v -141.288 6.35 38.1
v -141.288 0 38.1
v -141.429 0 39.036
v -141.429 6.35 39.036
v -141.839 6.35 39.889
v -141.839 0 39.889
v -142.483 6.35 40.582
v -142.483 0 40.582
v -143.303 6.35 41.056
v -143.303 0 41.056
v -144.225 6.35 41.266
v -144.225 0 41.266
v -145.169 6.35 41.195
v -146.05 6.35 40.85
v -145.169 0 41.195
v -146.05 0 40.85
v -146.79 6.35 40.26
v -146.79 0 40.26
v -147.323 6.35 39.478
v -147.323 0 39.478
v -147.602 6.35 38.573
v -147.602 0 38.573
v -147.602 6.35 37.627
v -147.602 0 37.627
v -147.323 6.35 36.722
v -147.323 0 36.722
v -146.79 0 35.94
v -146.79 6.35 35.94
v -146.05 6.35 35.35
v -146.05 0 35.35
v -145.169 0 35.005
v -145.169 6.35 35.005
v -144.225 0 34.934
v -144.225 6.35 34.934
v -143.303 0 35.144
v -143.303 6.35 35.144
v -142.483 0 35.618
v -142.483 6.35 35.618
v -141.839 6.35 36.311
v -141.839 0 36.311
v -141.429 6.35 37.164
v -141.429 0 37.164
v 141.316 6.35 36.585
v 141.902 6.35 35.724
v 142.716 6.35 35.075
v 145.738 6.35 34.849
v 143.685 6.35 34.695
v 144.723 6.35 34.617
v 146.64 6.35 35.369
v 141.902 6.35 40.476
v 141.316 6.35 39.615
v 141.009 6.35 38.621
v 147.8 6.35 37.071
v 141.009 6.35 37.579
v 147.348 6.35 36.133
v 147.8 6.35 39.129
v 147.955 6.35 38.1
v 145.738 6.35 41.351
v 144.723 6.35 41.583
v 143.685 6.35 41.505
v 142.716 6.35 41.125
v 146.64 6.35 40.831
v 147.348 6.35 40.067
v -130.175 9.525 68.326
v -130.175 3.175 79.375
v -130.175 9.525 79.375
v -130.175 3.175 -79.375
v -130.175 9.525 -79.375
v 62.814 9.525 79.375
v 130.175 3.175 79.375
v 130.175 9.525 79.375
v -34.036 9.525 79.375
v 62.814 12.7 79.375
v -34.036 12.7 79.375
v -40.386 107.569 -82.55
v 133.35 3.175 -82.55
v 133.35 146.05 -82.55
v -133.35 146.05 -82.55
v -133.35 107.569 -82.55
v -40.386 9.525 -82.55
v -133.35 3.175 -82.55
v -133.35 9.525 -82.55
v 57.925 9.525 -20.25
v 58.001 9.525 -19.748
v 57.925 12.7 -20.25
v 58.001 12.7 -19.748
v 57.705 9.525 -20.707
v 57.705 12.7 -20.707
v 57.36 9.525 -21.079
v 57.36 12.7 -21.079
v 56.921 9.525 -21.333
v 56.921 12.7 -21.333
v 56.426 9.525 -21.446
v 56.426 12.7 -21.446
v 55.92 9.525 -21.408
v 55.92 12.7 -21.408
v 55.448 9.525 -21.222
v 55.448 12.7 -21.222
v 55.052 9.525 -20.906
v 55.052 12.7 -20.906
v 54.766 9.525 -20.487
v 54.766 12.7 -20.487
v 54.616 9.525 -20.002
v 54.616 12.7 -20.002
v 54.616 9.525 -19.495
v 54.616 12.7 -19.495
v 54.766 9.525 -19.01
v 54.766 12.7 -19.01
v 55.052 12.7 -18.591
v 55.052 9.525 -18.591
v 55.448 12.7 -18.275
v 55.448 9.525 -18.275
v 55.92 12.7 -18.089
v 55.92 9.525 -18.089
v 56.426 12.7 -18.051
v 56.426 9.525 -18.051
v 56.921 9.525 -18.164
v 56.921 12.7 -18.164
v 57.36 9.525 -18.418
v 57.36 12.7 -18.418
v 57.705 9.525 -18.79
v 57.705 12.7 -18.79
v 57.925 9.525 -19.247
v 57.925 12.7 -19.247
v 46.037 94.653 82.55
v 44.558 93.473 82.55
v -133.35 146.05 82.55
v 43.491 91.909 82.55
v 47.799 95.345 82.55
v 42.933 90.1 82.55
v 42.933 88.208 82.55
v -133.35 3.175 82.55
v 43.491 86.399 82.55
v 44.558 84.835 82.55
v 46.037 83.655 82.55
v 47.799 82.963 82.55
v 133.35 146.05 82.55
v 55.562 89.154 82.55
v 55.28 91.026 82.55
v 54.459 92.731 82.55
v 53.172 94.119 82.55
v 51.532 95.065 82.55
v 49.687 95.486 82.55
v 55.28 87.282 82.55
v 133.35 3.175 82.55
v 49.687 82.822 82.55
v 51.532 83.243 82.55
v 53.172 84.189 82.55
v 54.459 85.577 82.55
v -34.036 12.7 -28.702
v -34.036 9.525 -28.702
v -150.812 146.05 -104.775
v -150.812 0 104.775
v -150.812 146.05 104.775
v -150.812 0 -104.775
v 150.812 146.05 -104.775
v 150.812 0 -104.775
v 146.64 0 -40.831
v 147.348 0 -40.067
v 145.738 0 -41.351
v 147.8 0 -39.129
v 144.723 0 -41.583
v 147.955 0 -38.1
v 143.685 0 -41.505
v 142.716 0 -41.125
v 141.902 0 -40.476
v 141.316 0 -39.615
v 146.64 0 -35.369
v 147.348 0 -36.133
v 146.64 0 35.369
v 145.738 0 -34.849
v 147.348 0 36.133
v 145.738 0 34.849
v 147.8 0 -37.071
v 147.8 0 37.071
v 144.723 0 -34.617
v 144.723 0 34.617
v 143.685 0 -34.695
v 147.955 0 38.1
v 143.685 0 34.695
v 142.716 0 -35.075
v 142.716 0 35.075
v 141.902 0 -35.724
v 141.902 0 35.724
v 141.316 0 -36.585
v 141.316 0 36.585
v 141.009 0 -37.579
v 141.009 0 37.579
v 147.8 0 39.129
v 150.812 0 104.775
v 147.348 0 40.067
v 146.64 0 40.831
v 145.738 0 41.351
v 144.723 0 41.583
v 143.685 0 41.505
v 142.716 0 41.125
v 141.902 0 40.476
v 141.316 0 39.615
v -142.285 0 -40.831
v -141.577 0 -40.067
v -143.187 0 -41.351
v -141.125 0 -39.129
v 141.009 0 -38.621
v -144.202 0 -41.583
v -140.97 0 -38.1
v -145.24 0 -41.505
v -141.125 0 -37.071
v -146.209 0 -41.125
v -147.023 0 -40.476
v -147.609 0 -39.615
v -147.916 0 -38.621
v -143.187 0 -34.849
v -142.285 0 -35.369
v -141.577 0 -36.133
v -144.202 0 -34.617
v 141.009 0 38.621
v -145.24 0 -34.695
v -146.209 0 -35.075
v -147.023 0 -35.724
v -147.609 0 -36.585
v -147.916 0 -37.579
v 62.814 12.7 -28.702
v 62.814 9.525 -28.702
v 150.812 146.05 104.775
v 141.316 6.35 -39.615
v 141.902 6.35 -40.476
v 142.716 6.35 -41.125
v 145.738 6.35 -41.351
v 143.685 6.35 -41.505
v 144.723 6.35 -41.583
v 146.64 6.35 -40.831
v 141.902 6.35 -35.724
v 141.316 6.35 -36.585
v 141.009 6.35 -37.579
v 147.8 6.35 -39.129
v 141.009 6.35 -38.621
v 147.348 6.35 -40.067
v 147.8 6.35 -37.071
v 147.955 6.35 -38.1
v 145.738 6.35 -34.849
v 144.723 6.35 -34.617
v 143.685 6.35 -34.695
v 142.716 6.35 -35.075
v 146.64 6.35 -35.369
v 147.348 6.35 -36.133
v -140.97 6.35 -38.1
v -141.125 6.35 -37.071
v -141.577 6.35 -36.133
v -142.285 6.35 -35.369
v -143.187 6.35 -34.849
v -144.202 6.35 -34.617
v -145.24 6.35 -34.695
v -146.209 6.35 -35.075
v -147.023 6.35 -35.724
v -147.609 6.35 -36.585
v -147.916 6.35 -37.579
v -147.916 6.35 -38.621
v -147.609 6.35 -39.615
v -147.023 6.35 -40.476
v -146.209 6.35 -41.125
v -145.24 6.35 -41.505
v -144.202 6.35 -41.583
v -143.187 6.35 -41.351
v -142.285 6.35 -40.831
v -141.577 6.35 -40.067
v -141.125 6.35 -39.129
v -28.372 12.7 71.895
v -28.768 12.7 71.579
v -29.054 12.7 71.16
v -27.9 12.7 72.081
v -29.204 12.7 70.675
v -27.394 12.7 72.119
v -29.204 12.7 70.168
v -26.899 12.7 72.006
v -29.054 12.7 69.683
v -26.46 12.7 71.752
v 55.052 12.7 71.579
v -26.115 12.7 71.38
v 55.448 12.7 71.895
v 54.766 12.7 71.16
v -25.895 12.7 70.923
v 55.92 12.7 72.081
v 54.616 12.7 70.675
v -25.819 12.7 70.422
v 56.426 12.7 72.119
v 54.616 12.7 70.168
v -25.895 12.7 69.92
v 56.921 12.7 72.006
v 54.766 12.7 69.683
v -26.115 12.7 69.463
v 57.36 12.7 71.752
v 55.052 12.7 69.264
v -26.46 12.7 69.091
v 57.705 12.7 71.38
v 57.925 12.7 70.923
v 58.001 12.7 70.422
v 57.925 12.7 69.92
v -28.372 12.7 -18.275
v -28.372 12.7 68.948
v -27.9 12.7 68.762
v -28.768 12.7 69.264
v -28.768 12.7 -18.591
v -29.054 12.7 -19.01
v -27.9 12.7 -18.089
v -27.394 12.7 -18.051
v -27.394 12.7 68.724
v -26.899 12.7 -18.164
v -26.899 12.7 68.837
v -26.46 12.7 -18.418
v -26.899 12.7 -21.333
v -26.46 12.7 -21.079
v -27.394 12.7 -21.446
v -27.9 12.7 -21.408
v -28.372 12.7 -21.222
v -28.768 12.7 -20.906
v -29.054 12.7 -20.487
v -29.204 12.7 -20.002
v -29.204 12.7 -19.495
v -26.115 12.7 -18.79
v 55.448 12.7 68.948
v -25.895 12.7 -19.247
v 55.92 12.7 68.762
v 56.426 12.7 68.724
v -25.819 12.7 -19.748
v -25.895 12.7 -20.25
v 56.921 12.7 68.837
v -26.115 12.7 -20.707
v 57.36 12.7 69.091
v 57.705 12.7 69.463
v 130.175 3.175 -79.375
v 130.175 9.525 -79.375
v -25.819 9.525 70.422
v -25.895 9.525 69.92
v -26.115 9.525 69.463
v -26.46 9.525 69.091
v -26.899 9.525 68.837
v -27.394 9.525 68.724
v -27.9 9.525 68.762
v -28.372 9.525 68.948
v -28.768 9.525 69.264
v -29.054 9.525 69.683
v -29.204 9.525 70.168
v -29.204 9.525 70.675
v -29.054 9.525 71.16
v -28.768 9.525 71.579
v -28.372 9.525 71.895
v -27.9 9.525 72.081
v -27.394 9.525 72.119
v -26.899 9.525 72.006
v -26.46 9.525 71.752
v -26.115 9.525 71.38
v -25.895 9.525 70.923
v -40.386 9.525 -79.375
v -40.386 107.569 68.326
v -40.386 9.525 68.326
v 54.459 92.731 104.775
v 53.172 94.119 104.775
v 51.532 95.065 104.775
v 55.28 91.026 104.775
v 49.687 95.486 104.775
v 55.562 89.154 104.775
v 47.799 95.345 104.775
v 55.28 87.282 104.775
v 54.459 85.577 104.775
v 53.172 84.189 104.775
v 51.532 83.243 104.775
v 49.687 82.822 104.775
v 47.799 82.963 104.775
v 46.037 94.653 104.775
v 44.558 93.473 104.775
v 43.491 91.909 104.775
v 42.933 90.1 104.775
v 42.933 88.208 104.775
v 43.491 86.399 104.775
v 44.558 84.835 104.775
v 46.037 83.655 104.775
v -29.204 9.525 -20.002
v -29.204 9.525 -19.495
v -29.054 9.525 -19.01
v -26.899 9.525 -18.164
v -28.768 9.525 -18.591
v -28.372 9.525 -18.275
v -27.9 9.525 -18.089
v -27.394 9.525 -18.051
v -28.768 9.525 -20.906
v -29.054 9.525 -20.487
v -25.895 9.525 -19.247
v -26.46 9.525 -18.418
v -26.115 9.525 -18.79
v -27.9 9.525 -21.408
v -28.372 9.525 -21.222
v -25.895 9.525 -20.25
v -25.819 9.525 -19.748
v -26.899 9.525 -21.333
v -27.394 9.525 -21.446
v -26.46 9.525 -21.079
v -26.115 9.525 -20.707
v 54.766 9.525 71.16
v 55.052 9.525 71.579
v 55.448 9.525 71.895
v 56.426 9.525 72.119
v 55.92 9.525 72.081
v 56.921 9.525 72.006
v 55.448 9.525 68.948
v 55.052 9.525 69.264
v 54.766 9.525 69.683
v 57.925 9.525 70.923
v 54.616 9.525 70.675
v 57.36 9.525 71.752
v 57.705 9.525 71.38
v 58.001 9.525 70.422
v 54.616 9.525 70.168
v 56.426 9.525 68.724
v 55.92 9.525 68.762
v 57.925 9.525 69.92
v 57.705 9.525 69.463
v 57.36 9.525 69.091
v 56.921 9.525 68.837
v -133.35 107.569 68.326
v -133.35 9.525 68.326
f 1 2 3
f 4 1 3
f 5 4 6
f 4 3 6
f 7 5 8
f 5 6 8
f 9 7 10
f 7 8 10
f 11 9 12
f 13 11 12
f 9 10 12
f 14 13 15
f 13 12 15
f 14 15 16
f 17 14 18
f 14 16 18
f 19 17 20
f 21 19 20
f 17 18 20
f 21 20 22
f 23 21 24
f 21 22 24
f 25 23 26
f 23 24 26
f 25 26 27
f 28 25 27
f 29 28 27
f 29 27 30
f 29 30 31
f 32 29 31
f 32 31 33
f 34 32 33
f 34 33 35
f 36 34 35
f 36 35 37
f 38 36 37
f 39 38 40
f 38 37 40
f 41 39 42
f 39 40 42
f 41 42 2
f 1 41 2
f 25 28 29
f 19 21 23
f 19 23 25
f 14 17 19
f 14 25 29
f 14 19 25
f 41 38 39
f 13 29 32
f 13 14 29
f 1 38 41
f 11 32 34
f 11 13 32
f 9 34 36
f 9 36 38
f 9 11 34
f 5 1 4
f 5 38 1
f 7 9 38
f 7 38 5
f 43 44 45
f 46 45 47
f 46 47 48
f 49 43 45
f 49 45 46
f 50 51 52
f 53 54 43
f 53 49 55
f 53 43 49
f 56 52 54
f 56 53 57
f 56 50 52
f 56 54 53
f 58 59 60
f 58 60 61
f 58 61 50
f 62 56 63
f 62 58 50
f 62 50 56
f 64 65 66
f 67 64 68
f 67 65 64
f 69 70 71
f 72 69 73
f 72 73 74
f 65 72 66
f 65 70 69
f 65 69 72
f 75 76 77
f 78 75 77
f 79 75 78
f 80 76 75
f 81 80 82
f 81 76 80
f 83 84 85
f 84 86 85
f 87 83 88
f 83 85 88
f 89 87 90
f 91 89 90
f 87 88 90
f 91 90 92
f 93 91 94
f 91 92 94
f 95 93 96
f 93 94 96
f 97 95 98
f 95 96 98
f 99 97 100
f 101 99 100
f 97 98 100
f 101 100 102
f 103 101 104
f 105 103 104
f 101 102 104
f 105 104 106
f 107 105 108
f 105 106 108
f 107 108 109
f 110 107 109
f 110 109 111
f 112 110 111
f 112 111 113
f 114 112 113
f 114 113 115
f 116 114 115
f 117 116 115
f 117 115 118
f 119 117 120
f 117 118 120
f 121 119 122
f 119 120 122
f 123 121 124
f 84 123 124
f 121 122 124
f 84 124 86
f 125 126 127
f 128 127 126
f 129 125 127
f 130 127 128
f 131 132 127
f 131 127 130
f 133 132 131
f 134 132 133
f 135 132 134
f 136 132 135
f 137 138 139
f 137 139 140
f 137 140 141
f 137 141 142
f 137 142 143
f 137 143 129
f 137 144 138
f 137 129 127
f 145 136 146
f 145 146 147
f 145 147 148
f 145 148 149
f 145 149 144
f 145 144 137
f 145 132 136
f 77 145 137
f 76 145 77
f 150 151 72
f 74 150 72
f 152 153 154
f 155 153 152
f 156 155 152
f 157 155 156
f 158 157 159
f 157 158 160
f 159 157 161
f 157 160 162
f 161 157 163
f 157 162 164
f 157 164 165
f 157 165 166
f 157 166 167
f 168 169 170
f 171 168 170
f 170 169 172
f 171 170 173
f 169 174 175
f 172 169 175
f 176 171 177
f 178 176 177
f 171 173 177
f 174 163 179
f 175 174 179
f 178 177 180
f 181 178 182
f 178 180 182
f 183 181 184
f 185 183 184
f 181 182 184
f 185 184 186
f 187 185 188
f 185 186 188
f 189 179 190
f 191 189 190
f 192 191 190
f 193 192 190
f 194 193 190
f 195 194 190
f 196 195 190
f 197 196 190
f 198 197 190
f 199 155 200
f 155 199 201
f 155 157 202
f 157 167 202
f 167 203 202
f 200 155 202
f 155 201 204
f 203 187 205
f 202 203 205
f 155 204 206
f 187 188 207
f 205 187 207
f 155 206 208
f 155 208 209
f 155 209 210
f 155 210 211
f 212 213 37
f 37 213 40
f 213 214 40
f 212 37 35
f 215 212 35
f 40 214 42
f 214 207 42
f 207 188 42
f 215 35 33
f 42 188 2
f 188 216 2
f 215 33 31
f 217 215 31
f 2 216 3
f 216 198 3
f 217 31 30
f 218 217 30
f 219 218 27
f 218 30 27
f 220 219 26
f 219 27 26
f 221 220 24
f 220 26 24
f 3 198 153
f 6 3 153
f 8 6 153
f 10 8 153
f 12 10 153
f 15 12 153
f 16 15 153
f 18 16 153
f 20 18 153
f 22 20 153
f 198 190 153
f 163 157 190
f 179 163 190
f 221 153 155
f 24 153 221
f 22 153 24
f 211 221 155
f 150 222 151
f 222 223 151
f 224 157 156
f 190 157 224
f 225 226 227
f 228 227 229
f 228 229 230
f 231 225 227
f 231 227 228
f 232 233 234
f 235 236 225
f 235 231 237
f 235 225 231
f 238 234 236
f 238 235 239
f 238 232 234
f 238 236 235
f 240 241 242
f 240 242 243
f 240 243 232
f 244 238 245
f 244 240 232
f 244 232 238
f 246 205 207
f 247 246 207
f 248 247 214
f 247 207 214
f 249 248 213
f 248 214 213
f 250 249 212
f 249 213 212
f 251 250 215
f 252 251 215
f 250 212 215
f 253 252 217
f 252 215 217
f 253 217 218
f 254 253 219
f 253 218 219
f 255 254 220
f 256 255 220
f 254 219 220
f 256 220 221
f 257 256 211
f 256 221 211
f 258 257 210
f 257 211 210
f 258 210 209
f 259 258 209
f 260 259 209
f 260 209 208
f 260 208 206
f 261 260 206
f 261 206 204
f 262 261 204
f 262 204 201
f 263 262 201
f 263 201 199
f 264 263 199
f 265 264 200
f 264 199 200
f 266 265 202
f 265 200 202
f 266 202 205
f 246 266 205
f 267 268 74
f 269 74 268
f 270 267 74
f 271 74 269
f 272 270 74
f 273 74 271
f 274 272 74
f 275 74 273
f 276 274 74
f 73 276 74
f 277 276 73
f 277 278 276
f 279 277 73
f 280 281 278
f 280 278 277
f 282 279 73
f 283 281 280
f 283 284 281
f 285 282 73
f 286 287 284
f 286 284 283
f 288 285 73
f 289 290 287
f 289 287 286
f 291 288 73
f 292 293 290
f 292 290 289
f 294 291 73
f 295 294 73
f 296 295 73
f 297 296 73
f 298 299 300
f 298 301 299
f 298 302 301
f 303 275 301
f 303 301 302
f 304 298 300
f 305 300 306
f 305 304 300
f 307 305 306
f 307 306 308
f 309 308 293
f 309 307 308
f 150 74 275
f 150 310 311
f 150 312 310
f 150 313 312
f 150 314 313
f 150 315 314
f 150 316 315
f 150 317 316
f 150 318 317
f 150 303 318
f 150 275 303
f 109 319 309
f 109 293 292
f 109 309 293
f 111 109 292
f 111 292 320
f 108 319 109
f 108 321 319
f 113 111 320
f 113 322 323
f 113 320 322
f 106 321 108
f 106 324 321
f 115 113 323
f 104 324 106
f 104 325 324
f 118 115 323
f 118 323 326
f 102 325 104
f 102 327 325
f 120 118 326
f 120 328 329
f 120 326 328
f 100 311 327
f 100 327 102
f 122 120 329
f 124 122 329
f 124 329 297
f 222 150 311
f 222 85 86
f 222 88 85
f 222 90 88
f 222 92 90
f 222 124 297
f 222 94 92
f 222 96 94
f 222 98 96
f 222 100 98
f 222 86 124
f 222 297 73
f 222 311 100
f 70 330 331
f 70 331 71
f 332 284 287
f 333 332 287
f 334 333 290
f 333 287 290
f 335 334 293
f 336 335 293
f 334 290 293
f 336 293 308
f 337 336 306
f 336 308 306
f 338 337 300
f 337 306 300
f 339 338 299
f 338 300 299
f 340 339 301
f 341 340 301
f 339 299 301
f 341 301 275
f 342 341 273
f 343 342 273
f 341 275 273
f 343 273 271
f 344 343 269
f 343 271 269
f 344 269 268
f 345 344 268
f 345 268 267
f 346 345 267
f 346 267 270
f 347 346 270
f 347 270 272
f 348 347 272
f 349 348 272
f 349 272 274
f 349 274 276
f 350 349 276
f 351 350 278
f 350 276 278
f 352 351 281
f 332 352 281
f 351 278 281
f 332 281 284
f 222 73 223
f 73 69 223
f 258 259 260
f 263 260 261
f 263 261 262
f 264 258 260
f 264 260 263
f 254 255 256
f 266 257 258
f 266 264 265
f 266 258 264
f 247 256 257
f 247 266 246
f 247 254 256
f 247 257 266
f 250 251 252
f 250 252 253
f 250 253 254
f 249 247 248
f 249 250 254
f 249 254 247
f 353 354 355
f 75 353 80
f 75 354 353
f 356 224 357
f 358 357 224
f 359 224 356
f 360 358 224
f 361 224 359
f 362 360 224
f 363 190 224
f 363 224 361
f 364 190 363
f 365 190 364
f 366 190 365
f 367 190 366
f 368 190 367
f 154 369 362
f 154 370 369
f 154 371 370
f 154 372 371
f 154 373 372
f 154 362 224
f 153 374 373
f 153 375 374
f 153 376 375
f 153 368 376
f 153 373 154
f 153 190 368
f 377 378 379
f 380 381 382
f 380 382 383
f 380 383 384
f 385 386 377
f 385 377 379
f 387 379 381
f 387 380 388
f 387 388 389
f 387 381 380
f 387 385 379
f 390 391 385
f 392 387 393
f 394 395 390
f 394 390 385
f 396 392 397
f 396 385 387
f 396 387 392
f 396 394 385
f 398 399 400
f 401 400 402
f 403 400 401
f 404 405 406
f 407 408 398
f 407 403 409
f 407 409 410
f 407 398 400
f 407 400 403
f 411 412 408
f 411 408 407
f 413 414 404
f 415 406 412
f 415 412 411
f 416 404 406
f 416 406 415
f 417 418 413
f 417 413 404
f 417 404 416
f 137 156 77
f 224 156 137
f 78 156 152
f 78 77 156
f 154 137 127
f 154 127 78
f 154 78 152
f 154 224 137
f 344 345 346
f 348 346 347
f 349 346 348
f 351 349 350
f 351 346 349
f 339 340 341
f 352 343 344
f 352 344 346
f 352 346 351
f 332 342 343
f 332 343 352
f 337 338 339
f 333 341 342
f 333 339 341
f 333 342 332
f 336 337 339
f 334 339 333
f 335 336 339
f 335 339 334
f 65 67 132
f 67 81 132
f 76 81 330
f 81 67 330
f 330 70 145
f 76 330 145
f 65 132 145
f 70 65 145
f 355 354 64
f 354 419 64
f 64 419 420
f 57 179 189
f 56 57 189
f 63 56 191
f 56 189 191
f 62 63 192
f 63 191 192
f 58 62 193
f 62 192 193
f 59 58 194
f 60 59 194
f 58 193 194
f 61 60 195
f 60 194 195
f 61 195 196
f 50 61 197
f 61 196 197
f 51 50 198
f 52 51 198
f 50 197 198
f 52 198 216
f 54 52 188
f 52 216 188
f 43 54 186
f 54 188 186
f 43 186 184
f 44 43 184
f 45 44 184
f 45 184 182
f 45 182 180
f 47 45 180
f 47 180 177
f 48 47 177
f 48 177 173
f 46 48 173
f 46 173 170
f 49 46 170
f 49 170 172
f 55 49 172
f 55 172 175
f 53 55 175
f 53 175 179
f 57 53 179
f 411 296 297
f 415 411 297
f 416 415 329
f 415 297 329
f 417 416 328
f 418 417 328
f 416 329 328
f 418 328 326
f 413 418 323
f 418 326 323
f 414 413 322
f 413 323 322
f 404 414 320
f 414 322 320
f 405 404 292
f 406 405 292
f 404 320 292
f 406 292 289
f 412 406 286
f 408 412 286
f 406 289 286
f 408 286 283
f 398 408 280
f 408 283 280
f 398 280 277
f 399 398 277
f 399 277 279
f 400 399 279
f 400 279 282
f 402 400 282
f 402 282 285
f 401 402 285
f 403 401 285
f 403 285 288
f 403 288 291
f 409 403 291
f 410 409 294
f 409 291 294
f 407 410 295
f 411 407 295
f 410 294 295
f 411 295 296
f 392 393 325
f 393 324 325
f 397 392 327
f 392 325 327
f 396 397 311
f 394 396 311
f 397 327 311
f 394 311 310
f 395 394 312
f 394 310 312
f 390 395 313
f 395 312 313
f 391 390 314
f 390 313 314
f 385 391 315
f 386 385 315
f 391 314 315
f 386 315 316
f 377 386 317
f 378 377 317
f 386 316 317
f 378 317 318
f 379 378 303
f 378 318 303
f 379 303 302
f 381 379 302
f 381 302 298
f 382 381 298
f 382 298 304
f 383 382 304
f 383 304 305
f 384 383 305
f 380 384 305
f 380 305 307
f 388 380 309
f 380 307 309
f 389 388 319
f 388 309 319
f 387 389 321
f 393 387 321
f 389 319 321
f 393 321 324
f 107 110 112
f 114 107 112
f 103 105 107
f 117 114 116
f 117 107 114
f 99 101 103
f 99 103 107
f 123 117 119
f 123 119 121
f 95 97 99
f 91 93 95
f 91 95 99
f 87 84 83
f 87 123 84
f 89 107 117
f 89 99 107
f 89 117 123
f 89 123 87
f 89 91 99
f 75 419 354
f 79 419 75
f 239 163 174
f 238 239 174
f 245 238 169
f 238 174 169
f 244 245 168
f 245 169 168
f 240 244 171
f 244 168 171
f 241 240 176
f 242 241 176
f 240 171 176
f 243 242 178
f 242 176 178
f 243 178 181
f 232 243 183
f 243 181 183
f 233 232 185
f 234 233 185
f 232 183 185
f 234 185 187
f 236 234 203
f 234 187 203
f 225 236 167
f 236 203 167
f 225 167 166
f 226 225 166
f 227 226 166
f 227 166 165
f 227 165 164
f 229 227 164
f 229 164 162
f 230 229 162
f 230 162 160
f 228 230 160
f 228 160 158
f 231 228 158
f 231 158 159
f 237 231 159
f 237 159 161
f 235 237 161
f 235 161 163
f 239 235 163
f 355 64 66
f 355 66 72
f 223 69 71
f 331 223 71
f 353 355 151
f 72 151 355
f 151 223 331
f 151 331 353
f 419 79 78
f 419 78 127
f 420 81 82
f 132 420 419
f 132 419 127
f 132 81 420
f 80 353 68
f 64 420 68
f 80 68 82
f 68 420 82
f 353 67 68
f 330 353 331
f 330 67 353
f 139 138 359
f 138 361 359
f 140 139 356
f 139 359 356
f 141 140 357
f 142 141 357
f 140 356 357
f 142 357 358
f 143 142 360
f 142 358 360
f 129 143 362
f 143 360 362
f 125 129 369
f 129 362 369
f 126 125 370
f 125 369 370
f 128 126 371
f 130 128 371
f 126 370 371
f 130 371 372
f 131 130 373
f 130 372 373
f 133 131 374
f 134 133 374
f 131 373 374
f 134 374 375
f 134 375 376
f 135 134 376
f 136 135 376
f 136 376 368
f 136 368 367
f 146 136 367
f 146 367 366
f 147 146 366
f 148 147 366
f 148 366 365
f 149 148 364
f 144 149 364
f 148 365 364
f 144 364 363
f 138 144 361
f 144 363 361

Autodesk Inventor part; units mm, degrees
ref_plane "YZ Plane" through (0, 0, 0) normal (1, 0, 0) x (0, 1, 0)
ref_plane "XZ Plane" through (0, 0, 0) normal (0, 1, 0) x (-1, 0, 0)
ref_plane "XY Plane" through (0, 0, 0) normal (0, 0, 1) x (1, 0, 0)
sketch "Sketch1" plane through (0, 0, 0) normal (0, 1, 0) x (-1, 0, 0)
  line L0 (133.35, 82.55) -> (-133.35, 82.55)
  line L1 (-133.35, 82.55) -> (-133.35, -82.55)
  line L2 (-133.35, -82.55) -> (133.35, -82.55)
  line L3 (133.35, -82.55) -> (133.35, 82.55)
  line L4 (133.35, 82.55) -> (-133.35, -82.55) construction
  line L5 (-133.35, 82.55) -> (133.35, -82.55) construction
  line L6 (-150.8125, 104.775) -> (150.8125, 104.775)
  line L7 (150.8125, 104.775) -> (150.8125, -104.775)
  line L8 (150.8125, -104.775) -> (-150.8125, -104.775)
  line L9 (-150.8125, -104.775) -> (-150.8125, 104.775)
  line L10 (-150.8125, 104.775) -> (150.8125, -104.775) construction
  line L11 (150.8125, 104.775) -> (-150.8125, -104.775) construction
  point P0 (0, 0)
  dimension "d0" = 165.1
  dimension "d1" = 266.7
  dimension "d2" = 209.55
  dimension "d3" = 301.625
extrude "Extrusion1" add sketch "Sketch1" along normal blind 146.05
sketch "Sketch2" plane through (0, 0, 0) normal (0, -1, 0) x (1, 0, 0)
  line L0 (133.35, 82.55) -> (-133.35, 82.55) projected
  line L1 (-133.35, -82.55) -> (133.35, -82.55) projected
  line L2 (-133.35, 82.55) -> (133.35, 82.55)
  line L3 (133.35, 82.55) -> (133.35, -82.55)
  line L4 (133.35, -82.55) -> (-133.35, -82.55)
  line L5 (-133.35, -82.55) -> (-133.35, 82.55)
  point P0 (0, 0)
  point P1 (133.35, 82.55)
  point P2 (-133.35, -82.55)
extrude "Extrusion2" add sketch "Sketch2" against normal blind 3.175
sketch "Sketch3" plane through (0, 3.175, 0) normal (0, 1, 0) x (1, 0, 0)
  line L0 (-133.35, -82.55) -> (-133.35, 82.55) projected
  line L1 (-133.35, 82.55) -> (133.35, 82.55) projected
  line L2 (-133.35, -82.55) -> (133.35, -82.55)
  line L3 (133.35, -82.55) -> (133.35, 82.55)
  line L4 (133.35, 82.55) -> (-133.35, 82.55)
  line L5 (-133.35, 82.55) -> (-133.35, -82.55)
  line L6 (130.175, -79.375) -> (-130.175, -79.375)
  line L7 (-130.175, -79.375) -> (-130.175, 79.375)
  line L8 (-130.175, 79.375) -> (130.175, 79.375)
  line L9 (130.175, 79.375) -> (130.175, -79.375)
  point P0 (0, 0)
  dimension "d8" = 3.175
extrude "Extrusion3" add sketch "Sketch3" along normal blind 6.35 contours L6 L7 L8 L9
sketch "Sketch5" plane through (-133.35, 146.05, 82.55) normal (1, 0, 0) x (0, 0, -1)
  line L0 (0, -38.481) -> (165.1, -38.481)
  line L1 (165.1, -38.481) -> (14.224, -38.481)
  line L2 (14.224, -38.481) -> (14.224, -136.525)
  line L3 (14.224, -136.525) -> (165.1, -136.525)
  line L4 (165.1, -136.525) -> (165.1, -38.481)
  point P0 (82.55, -146.05)
  point P1 (165.1, -142.875)
  dimension "d15" = 98.044
  dimension "d16" = 150.876
  dimension "d19" = 6.35
extrude "Extrusion5" add sketch "Sketch5" along normal blind 92.964
sketch "Sketch6" plane through (0, 9.525, 0) normal (0, 1, 0) x (1, 0, 0)
  line L0 (62.8142, 28.702) -> (-34.036, 28.702)
  line L1 (-34.036, 28.702) -> (-34.036, -79.375)
  line L2 (-34.036, -79.375) -> (62.8142, -79.375)
  line L3 (62.8142, -79.375) -> (62.8142, 28.702)
  line L4 (-130.175, -79.375) -> (130.175, -79.375) projected
  line L5 (-40.386, 82.55) -> (-40.386, -68.326) projected
  point P0 (0, 0)
  dimension "d20" = 108.077
  dimension "d21" = 96.8502
  dimension "d61" = 0
  dimension "d62" = 6.35
extrude "Extrusion6" add sketch "Sketch6" along normal blind 3.175
sketch "Sketch8" plane through (0, 0, 0) normal (0, -1, 0) x (1, 0, 0)
  circle A0 centre (144.4625, 38.1) radius 3.4925
  line L0 (-150.8125, 104.775) -> (150.8125, 104.775) projected
  line L1 (150.8125, 104.775) -> (150.8125, -104.775) projected
  circle A1 centre (144.4625, -38.1) radius 3.4925
  line L2 (150.8125, -104.775) -> (-150.8125, -104.775) projected
  circle A2 centre (-144.4625, 38.1) radius 3.175
  circle A3 centre (-144.4625, -38.1) radius 3.4925
  line L3 (-150.8125, -104.775) -> (-150.8125, 104.775) projected
  line L4 (150.8125, 50.8) -> (-150.8125, 50.8)
  line L5 (150.8125, -50.8) -> (-150.8125, -50.8)
  point P0 (0, 0)
  dimension "d28" = 6.985
  dimension "d30" = 6.35
  dimension "d31" = 6.35
  dimension "d33" = 6.985
  dimension "d34" = 6.35
  dimension "d36" = 6.35
  dimension "d38" = 6.985
  dimension "d39" = 6.35
  dimension "d55" = 50.8
  dimension "d56" = 50.8
  dimension "d57" = 12.7
  dimension "d58" = 12.7
  dimension "d59" = 12.7
  dimension "d60" = 12.7
extrude "Extrusion8" cut sketch "Sketch8" against normal blind 6.35 contours A0 | A1 | A2 | A3
sketch "Sketch11" plane through (0, 12.7, 0) normal (0, 1, 0) x (1, 0, 0)
  circle A0 centre (56.2991, 19.7485) radius 1.7018
  circle A1 centre (56.2991, -70.4215) radius 1.7018
  circle A2 centre (-27.5209, 19.7485) radius 1.7018
  circle A3 centre (-27.5209, -70.4215) radius 1.7018
  line L0 (62.8142, 28.702) -> (-34.036, 28.702) projected
  line L1 (-34.036, -79.375) -> (62.8142, -79.375) projected
  line L2 (62.8142, -79.375) -> (62.8142, 28.702) projected
  line L3 (-34.036, 28.702) -> (-34.036, -79.375) projected
  point P0 (0, 0)
  dimension "d82" = 3.4036
  dimension "d83" = 83.82
  dimension "d85" = 83.82
  dimension "d87" = 6.5151
  dimension "d88" = 6.5151
  dimension "d89" = 90.17
  dimension "d90" = 8.9535
  dimension "d91" = 3.4036
  dimension "d92" = 3.4036
  dimension "d93" = 3.4036
extrude "Extrusion11" cut sketch "Sketch11" against normal up to surface (3.175 mm away) contours A0 | A1 | A2 | A3
sketch "Sketch12" plane through (-150.8125, 0, 104.775) normal (0, 0, 1) x (1, 0, 0)
  circle A0 centre (200.025, 89.154) radius 6.35
  line L0 (301.625, 0) -> (301.625, 146.05) projected
  line L1 (0, 146.05) -> (301.625, 146.05) projected
  point P0 (150.8125, 0)
  dimension "d77" = 12.7
  dimension "d78" = 101.6
  dimension "d79" = 56.896
extrude "Extrusion12" cut sketch "Sketch12" against normal up to surface (22.225 mm away)
properties part number "JunctionBox" material "ABS Plastic"
